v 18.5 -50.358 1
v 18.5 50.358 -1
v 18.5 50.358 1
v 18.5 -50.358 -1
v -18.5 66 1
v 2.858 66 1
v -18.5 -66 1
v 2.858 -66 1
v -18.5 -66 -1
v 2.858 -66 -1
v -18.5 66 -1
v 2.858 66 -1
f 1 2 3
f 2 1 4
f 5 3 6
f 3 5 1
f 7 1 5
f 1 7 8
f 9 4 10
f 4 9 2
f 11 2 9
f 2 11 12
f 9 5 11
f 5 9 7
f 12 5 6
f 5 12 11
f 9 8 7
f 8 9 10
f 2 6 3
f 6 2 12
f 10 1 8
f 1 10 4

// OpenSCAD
$fn = 25;

Width   = 35;
Length  = 130;
Thick   = 2;

// Methods
module Post (x, y, h) {    
    translate ([x, y, 0])
    difference () {
		cylinder (r = 2.5, h = h);
		cylinder (r = 1.5, h = h + 1);
	}
}

difference() {
    translate([0, 0, 0]) 
    cube ([Width + 2, Length + 2, Thick], center = true);
    
    translate([18, 65, 0])
    rotate([0,0,45])
    cube ([20, 30, Thick], center = true);
    
    translate([18, -65, 0])
    rotate([0,0,315])
    cube ([20, 30, Thick], center = true);
}
